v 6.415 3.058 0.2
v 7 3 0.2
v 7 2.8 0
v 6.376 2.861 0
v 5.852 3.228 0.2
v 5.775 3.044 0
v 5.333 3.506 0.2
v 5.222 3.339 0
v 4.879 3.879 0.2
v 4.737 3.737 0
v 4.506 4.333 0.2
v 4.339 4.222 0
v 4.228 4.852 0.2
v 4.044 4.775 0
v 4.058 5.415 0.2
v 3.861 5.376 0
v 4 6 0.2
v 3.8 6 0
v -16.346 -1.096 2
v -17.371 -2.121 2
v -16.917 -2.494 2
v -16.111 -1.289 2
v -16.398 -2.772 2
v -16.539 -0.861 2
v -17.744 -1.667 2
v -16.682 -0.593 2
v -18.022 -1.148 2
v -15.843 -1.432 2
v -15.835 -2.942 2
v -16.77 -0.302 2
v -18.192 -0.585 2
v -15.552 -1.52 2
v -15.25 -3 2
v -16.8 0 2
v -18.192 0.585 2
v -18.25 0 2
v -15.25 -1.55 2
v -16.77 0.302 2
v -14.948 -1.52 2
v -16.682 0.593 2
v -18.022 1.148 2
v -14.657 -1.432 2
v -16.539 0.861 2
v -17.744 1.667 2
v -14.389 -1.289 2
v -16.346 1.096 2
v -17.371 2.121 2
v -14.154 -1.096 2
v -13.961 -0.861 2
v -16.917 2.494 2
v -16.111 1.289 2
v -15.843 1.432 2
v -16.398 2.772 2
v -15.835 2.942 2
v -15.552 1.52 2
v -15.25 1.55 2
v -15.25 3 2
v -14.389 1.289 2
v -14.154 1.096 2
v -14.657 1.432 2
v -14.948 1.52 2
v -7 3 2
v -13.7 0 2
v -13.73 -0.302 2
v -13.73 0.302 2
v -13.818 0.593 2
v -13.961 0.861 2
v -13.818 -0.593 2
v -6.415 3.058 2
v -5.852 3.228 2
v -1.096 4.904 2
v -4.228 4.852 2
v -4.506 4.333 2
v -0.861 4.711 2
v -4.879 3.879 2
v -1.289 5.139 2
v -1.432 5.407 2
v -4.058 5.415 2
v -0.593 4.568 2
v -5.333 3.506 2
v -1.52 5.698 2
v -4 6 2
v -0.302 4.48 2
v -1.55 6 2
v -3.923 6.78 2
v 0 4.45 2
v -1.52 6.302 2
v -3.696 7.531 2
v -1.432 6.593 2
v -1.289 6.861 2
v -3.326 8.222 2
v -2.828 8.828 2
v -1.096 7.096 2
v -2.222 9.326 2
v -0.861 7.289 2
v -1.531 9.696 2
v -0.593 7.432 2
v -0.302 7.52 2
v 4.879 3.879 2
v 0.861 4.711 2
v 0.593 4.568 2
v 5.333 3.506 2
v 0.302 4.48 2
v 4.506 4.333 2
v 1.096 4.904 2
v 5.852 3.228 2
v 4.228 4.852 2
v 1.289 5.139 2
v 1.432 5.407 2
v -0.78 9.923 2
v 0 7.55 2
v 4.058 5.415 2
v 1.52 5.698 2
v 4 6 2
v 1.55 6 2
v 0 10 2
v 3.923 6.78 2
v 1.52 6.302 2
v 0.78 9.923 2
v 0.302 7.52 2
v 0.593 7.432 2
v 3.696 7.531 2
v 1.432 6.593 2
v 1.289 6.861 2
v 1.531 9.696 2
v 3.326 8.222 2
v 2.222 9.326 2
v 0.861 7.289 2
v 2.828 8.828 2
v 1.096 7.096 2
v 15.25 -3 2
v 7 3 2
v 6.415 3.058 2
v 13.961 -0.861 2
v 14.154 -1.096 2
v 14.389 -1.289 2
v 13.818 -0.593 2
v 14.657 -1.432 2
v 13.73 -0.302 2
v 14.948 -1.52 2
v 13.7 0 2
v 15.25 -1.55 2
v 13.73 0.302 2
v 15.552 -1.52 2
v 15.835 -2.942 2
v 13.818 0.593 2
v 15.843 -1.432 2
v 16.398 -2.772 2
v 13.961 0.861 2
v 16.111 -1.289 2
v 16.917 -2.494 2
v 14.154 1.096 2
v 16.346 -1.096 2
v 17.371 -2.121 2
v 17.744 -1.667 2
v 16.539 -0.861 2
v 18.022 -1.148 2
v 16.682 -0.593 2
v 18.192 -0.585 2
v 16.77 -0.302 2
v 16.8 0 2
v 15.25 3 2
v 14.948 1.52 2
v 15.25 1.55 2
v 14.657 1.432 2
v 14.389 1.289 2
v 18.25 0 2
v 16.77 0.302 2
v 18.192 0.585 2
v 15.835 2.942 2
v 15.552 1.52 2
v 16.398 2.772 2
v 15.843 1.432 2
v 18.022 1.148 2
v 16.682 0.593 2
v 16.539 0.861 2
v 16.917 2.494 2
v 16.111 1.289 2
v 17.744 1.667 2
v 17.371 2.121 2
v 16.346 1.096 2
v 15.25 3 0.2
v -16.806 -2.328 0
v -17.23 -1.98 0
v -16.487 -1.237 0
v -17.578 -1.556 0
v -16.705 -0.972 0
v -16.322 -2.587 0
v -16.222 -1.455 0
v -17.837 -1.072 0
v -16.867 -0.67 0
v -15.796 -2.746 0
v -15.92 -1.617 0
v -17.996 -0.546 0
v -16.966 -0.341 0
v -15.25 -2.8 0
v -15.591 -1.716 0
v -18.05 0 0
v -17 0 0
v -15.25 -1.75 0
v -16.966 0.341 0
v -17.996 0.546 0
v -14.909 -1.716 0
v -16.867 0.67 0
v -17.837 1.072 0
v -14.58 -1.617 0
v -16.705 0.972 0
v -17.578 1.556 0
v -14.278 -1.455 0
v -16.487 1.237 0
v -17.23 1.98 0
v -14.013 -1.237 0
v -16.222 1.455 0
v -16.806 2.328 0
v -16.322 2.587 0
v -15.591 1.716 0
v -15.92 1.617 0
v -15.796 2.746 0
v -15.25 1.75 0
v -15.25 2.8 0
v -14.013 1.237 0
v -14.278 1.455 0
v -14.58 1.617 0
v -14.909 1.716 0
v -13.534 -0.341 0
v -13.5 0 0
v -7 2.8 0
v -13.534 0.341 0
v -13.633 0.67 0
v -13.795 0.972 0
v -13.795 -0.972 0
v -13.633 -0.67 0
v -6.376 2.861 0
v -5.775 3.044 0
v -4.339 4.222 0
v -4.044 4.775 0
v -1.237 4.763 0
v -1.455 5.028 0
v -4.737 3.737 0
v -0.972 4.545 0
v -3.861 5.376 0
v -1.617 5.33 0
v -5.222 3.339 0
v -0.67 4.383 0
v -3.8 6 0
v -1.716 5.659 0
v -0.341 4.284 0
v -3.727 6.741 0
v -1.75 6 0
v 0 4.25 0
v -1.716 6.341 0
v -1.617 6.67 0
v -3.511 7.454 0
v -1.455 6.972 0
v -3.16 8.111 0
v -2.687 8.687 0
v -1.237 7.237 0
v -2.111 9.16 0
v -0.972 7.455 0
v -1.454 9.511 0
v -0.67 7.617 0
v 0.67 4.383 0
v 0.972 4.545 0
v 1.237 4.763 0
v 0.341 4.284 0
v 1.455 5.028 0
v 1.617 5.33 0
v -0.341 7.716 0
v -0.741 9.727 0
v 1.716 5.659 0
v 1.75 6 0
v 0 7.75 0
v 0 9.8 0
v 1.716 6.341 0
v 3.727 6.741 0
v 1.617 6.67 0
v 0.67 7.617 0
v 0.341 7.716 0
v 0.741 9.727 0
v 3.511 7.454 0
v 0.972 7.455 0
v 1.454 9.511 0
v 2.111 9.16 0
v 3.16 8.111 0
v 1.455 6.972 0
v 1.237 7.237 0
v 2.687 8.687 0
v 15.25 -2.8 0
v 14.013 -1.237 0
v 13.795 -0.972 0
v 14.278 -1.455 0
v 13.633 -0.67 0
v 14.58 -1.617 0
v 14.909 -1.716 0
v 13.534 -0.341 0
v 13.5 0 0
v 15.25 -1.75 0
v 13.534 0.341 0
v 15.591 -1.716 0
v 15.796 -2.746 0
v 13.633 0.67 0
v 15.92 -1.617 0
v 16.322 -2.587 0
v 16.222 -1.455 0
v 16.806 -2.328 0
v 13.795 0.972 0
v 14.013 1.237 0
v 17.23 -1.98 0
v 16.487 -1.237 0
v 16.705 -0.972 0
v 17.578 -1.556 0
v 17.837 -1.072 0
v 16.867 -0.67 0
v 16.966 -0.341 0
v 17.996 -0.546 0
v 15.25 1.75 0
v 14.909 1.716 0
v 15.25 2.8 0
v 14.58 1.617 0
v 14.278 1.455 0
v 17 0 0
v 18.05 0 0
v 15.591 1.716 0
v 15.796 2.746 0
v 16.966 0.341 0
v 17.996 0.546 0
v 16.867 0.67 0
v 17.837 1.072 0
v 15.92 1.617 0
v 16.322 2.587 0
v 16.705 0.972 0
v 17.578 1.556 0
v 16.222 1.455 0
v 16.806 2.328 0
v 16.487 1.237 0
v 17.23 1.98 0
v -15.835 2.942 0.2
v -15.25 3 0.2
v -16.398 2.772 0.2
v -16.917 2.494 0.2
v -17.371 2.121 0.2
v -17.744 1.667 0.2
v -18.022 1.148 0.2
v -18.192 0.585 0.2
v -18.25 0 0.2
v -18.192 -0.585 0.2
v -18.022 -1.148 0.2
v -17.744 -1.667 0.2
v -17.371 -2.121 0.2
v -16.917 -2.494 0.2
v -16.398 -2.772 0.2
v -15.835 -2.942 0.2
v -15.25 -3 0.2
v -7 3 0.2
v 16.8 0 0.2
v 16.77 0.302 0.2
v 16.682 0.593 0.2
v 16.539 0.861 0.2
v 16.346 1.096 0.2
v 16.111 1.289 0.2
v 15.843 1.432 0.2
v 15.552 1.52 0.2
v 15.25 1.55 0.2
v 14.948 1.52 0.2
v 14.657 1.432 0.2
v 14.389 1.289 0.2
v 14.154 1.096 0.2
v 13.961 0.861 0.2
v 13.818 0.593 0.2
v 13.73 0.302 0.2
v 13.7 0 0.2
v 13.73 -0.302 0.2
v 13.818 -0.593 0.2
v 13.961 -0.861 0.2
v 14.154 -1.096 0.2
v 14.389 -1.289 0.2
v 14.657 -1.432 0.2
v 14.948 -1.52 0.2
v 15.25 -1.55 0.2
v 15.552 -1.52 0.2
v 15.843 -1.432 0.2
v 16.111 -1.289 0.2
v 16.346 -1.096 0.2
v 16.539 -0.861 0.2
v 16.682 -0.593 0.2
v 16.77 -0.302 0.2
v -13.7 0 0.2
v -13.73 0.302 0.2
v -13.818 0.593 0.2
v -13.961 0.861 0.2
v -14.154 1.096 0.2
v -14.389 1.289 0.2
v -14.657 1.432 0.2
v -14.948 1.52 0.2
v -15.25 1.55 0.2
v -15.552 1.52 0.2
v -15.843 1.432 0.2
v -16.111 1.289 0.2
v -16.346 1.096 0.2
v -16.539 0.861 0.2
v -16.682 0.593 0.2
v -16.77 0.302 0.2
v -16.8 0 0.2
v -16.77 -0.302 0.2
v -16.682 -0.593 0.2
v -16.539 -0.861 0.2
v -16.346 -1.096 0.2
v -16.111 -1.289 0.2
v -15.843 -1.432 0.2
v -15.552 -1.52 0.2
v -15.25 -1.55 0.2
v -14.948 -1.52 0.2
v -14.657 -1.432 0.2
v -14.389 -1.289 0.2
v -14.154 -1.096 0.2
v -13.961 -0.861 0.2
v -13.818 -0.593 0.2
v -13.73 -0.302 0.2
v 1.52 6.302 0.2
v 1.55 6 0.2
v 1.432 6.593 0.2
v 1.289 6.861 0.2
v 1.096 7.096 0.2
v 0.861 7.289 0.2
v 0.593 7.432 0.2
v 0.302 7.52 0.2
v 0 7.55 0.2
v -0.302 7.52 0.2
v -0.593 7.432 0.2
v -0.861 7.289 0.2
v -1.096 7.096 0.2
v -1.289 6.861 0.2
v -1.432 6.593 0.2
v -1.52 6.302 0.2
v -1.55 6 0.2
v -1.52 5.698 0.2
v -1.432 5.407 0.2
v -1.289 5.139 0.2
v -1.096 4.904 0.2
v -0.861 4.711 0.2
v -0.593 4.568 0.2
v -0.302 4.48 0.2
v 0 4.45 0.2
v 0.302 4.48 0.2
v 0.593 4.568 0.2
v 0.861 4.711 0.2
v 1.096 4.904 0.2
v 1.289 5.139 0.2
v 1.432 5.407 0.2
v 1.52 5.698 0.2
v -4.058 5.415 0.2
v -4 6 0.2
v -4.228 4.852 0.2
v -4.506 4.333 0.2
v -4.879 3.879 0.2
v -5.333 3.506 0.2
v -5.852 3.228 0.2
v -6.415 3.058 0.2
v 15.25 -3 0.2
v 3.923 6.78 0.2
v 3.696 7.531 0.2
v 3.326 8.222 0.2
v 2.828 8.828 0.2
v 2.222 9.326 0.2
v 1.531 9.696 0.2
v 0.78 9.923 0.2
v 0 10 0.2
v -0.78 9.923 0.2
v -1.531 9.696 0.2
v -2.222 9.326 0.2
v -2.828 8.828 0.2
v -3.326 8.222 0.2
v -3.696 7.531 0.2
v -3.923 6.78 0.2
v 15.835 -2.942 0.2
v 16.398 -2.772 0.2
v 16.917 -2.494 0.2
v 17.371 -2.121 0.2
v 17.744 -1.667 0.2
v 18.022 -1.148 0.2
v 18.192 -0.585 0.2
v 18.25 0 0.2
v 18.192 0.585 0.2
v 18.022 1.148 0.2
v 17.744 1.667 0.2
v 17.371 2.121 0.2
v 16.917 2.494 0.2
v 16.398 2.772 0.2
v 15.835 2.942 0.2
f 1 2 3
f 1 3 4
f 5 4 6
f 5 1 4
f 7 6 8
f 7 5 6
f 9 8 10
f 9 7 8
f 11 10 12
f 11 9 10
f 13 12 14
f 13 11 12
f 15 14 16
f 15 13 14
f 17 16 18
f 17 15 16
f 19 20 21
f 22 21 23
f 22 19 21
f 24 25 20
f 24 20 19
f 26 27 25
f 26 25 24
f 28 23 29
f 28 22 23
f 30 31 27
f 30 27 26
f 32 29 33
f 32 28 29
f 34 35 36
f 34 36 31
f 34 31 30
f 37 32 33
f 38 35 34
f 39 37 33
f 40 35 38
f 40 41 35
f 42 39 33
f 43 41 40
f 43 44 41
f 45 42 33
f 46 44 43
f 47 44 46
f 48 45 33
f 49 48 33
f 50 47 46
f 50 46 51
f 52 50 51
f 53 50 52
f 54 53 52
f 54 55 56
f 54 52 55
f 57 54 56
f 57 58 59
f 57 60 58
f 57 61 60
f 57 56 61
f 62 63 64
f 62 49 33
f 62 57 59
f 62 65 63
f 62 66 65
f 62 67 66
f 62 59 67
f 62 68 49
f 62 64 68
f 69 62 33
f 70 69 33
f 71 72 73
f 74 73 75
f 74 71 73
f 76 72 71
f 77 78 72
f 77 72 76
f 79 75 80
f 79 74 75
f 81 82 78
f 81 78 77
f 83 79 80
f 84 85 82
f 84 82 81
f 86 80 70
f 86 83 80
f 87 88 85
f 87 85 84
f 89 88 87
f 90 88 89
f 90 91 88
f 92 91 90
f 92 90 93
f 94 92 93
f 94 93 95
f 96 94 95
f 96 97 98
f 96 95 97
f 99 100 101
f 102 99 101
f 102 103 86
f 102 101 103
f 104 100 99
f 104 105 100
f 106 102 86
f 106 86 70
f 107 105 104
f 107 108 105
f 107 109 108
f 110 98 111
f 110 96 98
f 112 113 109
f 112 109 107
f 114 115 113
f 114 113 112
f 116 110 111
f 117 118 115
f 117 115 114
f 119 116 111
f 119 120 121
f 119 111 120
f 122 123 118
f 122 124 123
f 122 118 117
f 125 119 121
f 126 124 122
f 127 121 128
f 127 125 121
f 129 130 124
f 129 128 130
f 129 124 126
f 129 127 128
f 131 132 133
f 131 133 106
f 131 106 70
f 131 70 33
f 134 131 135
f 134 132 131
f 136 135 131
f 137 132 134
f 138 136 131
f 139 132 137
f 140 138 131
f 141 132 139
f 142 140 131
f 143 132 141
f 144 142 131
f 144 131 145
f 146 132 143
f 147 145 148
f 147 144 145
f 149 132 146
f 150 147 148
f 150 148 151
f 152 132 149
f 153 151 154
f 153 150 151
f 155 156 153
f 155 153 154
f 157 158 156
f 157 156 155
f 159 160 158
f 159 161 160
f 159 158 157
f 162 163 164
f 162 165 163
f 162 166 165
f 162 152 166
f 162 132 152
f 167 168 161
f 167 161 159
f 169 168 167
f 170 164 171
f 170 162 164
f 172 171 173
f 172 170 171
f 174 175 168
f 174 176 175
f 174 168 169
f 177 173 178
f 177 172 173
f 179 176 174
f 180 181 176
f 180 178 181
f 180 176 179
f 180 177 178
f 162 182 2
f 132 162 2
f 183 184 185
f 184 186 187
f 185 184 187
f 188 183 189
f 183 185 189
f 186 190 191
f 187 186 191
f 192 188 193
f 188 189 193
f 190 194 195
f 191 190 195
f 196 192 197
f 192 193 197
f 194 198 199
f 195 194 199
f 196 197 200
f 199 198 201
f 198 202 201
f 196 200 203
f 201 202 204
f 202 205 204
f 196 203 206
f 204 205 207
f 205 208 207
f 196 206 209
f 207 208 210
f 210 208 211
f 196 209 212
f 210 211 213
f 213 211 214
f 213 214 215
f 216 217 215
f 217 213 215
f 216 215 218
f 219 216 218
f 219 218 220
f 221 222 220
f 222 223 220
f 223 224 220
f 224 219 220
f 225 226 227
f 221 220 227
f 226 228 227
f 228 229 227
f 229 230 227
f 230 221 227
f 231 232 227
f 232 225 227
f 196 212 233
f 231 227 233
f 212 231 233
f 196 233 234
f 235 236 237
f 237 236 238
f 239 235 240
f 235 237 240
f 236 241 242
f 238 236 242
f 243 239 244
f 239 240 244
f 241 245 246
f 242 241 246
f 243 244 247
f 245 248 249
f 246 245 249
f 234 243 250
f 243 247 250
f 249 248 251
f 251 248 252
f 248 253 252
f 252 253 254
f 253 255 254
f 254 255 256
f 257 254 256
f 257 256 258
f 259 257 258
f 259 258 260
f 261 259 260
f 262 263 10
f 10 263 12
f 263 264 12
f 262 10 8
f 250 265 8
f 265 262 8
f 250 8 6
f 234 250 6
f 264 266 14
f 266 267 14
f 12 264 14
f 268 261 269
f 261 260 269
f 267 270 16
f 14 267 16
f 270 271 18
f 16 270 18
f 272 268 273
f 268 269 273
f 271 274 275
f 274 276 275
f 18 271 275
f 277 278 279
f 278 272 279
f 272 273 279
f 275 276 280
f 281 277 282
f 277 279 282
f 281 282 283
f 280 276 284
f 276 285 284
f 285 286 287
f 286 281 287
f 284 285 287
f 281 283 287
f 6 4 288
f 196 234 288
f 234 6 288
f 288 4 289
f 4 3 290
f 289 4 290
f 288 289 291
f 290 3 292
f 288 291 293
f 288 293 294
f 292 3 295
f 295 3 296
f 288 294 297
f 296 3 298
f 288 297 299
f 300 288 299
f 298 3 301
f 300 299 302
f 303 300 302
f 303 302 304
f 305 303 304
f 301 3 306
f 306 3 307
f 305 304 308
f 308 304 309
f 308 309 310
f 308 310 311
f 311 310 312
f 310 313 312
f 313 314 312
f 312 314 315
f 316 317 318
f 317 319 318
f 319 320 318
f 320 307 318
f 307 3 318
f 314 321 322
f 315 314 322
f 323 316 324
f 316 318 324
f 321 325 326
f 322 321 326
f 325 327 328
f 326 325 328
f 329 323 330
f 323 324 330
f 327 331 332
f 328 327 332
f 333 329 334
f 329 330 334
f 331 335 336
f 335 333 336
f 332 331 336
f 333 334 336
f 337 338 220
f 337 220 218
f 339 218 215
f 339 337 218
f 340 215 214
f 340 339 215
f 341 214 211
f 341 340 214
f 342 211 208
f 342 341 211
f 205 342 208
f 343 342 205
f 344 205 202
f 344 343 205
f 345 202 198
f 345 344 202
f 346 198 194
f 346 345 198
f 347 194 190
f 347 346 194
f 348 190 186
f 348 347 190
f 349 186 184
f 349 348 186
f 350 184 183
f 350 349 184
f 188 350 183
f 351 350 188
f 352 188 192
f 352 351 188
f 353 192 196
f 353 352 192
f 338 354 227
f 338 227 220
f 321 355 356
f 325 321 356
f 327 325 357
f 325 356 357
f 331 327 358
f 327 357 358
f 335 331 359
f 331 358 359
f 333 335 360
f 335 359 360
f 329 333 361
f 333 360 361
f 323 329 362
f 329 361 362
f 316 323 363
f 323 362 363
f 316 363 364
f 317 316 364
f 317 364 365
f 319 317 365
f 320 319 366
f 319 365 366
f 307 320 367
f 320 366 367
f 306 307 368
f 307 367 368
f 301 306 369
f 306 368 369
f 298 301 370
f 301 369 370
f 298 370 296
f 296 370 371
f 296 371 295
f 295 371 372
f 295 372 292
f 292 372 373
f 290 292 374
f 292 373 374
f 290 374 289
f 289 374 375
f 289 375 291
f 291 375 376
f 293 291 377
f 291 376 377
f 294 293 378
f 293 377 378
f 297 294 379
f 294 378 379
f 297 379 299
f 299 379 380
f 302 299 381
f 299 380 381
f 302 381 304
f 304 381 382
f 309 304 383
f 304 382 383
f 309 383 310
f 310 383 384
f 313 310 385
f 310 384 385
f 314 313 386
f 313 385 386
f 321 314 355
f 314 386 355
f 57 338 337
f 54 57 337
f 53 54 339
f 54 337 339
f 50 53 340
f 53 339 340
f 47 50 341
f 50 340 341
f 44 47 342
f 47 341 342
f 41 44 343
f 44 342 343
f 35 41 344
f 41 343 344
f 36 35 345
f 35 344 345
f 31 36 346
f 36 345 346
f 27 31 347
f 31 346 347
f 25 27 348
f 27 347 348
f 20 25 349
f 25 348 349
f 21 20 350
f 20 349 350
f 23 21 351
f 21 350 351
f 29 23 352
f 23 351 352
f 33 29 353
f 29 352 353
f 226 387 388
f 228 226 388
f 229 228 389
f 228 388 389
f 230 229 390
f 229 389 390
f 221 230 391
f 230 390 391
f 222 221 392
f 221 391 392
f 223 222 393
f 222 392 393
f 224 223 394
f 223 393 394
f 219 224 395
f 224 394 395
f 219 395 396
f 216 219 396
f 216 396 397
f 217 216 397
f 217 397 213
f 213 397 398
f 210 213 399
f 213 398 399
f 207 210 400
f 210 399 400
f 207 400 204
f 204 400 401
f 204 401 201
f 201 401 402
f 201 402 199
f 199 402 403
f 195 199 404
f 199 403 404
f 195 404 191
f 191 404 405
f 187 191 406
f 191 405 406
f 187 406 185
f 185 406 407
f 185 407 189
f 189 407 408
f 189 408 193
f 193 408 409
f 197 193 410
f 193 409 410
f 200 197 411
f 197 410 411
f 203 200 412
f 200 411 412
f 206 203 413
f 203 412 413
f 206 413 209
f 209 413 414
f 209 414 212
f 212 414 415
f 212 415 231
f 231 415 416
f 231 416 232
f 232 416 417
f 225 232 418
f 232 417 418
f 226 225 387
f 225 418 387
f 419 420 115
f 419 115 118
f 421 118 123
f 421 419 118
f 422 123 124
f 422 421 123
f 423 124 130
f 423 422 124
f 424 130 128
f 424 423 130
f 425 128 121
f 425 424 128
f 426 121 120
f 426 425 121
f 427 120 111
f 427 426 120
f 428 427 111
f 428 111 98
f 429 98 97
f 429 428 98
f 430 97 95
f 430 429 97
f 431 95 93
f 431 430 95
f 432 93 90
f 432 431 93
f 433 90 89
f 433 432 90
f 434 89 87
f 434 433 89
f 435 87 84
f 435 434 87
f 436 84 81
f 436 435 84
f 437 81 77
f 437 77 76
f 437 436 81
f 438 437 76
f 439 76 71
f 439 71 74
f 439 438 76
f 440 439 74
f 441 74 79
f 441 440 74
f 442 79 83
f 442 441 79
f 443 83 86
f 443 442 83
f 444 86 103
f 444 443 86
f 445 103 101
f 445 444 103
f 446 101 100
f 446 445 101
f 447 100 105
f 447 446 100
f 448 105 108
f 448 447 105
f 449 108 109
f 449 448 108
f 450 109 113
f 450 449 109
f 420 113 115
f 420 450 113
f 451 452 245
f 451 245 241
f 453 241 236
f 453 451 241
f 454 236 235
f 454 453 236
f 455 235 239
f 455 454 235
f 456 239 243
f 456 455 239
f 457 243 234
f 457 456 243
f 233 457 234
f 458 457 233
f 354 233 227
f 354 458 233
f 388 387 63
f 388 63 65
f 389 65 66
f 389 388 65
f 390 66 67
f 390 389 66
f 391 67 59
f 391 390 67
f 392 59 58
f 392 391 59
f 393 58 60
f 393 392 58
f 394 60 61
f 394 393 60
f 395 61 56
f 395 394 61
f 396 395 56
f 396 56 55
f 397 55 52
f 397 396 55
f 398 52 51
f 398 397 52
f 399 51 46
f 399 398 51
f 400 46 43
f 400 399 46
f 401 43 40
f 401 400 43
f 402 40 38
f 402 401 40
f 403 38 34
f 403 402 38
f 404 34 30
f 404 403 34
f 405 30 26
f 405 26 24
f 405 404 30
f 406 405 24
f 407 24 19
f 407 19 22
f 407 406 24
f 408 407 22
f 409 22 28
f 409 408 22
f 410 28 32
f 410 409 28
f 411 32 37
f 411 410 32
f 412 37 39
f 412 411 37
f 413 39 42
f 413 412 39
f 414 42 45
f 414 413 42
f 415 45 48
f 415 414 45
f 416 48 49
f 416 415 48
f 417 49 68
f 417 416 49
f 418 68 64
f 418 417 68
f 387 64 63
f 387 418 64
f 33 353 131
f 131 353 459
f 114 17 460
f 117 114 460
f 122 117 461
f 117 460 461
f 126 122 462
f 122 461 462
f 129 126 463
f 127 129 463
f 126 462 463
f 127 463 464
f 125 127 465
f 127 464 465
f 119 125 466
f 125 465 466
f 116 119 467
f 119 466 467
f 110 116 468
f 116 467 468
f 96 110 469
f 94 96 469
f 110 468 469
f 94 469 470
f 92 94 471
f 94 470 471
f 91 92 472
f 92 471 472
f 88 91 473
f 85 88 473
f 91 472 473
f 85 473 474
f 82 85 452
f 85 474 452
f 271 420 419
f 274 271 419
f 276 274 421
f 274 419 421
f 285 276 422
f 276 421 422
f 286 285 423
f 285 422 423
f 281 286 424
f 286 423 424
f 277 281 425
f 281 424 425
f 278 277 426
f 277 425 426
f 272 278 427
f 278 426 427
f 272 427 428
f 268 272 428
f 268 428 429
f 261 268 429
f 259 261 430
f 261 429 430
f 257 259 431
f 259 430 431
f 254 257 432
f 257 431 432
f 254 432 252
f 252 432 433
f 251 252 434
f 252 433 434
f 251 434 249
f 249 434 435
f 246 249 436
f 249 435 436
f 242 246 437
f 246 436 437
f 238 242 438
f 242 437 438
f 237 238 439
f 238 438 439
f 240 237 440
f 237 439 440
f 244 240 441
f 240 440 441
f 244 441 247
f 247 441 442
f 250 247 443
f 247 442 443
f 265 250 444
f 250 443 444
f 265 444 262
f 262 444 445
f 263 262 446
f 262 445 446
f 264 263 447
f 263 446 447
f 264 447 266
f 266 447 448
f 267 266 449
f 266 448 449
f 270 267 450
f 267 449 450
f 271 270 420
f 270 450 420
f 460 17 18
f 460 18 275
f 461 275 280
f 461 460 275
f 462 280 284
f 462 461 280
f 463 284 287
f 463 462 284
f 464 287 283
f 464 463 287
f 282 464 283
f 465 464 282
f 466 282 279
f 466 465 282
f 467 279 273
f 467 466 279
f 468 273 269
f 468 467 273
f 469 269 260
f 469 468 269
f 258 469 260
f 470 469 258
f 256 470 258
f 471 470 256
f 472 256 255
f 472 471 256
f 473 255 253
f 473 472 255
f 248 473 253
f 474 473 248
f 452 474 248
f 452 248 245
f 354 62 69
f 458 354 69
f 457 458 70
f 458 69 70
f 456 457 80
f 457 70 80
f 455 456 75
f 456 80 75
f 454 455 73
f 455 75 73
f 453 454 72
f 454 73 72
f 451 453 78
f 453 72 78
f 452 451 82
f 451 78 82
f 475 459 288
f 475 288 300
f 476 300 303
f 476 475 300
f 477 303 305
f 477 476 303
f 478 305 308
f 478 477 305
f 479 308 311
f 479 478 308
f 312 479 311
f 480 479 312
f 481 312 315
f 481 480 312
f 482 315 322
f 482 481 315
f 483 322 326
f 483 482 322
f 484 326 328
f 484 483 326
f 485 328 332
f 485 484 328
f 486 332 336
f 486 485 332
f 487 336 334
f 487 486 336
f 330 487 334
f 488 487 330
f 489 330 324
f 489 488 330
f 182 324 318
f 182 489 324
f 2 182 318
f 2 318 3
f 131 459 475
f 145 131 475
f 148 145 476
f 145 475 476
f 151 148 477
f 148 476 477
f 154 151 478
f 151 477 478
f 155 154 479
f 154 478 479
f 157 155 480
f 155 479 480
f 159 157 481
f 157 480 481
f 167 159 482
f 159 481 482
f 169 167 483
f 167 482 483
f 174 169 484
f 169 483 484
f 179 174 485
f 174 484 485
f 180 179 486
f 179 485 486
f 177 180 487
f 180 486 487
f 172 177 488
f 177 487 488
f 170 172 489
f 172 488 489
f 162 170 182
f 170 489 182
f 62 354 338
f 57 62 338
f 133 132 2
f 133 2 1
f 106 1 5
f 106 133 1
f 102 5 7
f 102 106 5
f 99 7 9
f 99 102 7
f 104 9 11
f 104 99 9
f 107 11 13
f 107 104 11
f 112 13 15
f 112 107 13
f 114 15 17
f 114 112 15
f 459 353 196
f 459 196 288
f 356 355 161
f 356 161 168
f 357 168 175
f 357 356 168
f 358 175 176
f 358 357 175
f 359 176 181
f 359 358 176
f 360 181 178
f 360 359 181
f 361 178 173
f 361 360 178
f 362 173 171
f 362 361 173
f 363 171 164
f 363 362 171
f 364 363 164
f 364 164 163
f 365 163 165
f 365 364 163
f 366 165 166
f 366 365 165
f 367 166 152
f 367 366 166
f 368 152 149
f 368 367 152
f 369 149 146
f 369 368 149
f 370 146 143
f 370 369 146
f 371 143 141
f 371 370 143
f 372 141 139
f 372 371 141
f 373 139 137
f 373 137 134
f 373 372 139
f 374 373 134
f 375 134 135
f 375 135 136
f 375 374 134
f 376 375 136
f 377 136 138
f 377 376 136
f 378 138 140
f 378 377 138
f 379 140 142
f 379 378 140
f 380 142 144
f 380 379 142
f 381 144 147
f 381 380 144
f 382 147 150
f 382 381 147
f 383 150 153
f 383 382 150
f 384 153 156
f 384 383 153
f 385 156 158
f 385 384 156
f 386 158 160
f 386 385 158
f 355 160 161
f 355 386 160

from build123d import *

# Parameters (mm, degrees)
F0_R     = 1.55
F1_DEPTH = 2
F2_R     = 2.99999
F3_SIZE  = 0.2


# Not quite as in the source:
# - a fillet or chamfer is up to 0.001 mm smaller than in the source, because OpenCascade refuses the exact size


with BuildPart() as f1:
    # F0 (on Top) → F1 (new body)
    with BuildSketch(Plane.XY):
        with BuildLine():
            ThreePointArc((-15.25, 3), (-18.25, 0), (-15.25, -3))
            Line((-15.25, -3), (15.25, -3))
            ThreePointArc((15.25, -3), (18.25, 0), (15.25, 3))
            Line((15.25, 3), (4, 3))
            Line((4, 3), (-4, 3))
            Line((-4, 3), (-15.25, 3))
        make_face()
        with Locations((-15.25, 0)):
            Circle(F0_R, mode=Mode.SUBTRACT)
        with Locations((15.25, 0)):
            Circle(F0_R, mode=Mode.SUBTRACT)
        with BuildLine():
            Line((-4, 6), (-4, 3))
            Line((-4, 3), (4, 3))
            Line((4, 3), (4, 6))
            ThreePointArc((4, 6), (0, 10), (-4, 6))
        make_face()
        with Locations((0, 6)):
            Circle(F0_R, mode=Mode.SUBTRACT)
    extrude(amount=F1_DEPTH)

    # F2 (radius 3 in the source; OpenCascade refuses exactly that, so slightly less here)
    f2_edges = [f1.edges().sort_by_distance(p)[0] for p in [
        (4, 3, 1),
        (-4, 3, 1),
    ]]
    fillet(f2_edges, radius=F2_R)

    # F3
    f3_edges = [f1.edges().sort_by_distance(p)[0] for p in [
        (11.124995, 3, 0),
        (4.878677, 3.878677, 0),
        (18.25, 0, 0),
        (4, 5.999995, 0),
        (0, -3, 0),
        (0, 10, 0),
        (-18.25, 0, 0),
        (-4, 5.999995, 0),
        (-11.124995, 3, 0),
        (-4.878677, 3.878677, 0),
        (-16.8, 0, 0),
        (13.7, 0, 0),
        (-1.55, 6, 0),
    ]]
    chamfer(f3_edges, length=F3_SIZE)


solid = f1.part
